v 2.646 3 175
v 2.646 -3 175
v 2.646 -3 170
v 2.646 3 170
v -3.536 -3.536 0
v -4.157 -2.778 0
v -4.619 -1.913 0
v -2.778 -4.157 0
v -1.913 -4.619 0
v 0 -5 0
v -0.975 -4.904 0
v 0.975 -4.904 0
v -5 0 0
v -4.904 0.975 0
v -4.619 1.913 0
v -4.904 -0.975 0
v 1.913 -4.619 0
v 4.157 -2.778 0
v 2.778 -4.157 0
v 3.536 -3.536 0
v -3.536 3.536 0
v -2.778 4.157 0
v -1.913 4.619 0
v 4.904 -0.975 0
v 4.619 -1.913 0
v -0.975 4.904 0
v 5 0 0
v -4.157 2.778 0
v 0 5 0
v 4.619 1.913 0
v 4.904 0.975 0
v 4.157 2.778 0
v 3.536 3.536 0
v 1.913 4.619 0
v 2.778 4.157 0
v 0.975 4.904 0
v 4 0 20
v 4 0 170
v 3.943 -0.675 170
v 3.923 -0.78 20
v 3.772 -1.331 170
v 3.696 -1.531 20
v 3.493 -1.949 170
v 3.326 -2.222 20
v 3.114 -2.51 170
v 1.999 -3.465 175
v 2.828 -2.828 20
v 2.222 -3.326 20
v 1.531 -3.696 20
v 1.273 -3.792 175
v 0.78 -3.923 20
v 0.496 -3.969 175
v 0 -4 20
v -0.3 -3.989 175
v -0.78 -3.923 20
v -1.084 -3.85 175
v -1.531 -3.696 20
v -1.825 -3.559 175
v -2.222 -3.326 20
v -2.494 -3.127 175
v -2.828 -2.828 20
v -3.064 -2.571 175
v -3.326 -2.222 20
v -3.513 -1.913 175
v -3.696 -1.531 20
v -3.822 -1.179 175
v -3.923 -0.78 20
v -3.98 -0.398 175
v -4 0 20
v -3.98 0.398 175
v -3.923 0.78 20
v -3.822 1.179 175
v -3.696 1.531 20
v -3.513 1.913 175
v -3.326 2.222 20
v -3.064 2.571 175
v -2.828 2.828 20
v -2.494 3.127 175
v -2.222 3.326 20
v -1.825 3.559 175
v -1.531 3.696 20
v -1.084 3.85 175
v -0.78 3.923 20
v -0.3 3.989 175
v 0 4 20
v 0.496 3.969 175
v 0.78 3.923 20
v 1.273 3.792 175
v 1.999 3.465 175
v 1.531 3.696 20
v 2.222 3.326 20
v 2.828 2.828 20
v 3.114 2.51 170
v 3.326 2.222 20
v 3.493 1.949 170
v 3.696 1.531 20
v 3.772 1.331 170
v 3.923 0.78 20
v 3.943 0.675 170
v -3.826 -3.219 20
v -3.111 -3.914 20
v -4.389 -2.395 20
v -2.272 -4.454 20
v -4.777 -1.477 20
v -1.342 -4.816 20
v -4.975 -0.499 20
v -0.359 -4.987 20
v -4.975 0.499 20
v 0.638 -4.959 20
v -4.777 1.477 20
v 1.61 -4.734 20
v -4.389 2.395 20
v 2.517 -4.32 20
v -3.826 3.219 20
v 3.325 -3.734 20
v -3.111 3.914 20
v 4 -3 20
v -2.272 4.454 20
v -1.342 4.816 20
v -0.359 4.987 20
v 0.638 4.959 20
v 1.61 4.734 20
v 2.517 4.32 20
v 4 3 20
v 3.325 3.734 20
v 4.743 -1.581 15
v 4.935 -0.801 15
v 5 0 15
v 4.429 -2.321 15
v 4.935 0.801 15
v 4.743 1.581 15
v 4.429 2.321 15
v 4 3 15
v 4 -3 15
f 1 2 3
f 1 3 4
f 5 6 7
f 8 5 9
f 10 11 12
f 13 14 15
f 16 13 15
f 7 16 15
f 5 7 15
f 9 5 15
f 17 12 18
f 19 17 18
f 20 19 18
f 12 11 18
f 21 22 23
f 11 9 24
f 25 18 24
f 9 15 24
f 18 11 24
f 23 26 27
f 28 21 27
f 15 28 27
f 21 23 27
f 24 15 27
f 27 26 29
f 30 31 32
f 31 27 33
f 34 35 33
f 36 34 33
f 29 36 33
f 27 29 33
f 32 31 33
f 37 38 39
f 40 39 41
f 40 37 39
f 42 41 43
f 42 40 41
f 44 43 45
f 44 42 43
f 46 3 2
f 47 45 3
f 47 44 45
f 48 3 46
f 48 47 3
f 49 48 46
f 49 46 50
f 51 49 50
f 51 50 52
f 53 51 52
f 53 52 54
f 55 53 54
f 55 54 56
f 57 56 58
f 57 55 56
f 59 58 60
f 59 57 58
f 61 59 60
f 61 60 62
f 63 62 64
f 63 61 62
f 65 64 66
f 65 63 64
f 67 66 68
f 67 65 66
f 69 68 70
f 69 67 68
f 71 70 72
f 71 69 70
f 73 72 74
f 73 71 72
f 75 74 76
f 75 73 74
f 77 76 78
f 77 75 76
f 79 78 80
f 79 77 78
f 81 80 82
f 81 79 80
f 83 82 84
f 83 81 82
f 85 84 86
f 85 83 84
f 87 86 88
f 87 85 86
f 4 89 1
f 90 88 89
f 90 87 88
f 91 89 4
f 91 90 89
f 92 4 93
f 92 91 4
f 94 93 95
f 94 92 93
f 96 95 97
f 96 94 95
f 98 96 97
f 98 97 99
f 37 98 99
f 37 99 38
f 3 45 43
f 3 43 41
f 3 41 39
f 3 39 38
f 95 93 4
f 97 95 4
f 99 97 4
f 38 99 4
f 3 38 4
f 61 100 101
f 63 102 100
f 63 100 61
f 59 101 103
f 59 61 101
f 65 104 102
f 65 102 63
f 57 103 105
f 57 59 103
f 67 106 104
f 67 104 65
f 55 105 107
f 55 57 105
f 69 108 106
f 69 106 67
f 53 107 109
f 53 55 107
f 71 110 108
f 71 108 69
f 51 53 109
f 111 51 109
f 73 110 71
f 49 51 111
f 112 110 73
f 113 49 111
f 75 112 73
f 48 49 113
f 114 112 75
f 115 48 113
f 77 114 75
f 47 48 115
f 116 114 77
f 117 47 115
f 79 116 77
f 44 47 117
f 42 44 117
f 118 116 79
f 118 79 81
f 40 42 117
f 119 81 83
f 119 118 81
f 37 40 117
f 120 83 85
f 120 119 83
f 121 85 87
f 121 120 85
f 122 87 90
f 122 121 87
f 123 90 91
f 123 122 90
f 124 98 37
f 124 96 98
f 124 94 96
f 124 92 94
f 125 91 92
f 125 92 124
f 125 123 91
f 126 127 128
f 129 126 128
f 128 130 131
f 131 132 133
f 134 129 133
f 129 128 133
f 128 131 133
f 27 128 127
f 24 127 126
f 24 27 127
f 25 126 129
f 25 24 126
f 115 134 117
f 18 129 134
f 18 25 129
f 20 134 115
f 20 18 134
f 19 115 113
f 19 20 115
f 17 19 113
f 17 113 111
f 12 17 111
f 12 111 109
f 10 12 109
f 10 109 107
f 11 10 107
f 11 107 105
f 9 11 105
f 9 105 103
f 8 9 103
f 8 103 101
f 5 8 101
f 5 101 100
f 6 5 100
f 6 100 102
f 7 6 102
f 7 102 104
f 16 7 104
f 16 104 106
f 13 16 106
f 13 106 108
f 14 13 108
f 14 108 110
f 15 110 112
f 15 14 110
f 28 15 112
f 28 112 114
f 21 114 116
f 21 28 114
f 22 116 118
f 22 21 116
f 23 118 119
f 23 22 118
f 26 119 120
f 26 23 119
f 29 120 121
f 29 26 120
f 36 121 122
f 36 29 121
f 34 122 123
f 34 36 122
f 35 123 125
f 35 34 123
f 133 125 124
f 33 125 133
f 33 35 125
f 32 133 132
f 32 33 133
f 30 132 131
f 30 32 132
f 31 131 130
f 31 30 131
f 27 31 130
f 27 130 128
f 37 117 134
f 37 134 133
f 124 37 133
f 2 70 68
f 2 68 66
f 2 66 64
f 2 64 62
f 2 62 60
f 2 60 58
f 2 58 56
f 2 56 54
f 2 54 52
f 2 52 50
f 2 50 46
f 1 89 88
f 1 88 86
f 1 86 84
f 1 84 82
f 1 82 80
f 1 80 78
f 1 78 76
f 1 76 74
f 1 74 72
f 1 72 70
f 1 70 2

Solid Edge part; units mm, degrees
sketch "Sketch1" plane through (0, 0, 0) normal (0, 0, 1) x (1, 0, 0)
  circle A0 centre (0, 0) radius 5
extrude "Protrusion1" add sketch "Sketch1" along normal blind 20
sketch "Sketch2" plane through (0, 0, 20) normal (0, 0, 1) x (1, 0, 0)
  circle A0 centre (0, 0) radius 4
extrude "ExtrudedProtrusion_2" add sketch "Sketch2" along normal blind 155
sketch "Sketch3" plane through (0, 0, 20) normal (0, 0, 1) x (0, -1, 0)
  line L0 (-3.8216, 6.2347) -> (3.8216, 6.2347)
  line L1 (3.8216, 6.2347) -> (3.8216, 4)
  line L2 (3.8216, 4) -> (0, 4)
  line L3 (0, 4) -> (-3.8216, 4)
  line L4 (-3.8216, 4) -> (-3.8216, 6.2347)
extrude "ExtrudedCutout_1" cut sketch "Sketch3" against normal blind 5
sketch "Sketch4" plane through (0, 0, 175) normal (0, 0, 1) x (0, -1, 0)
  line L0 (-3.2306, 4) -> (4.2507, 4)
  line L1 (4.2507, 4) -> (4.2507, 2.6458)
  line L2 (4.2507, 2.6458) -> (0, 2.6458)
  line L3 (0, 2.6458) -> (-3.2306, 2.6458)
  line L4 (-3.2306, 2.6458) -> (-3.2306, 4)
extrude "ExtrudedCutout_2" cut sketch "Sketch4" against normal blind 5
